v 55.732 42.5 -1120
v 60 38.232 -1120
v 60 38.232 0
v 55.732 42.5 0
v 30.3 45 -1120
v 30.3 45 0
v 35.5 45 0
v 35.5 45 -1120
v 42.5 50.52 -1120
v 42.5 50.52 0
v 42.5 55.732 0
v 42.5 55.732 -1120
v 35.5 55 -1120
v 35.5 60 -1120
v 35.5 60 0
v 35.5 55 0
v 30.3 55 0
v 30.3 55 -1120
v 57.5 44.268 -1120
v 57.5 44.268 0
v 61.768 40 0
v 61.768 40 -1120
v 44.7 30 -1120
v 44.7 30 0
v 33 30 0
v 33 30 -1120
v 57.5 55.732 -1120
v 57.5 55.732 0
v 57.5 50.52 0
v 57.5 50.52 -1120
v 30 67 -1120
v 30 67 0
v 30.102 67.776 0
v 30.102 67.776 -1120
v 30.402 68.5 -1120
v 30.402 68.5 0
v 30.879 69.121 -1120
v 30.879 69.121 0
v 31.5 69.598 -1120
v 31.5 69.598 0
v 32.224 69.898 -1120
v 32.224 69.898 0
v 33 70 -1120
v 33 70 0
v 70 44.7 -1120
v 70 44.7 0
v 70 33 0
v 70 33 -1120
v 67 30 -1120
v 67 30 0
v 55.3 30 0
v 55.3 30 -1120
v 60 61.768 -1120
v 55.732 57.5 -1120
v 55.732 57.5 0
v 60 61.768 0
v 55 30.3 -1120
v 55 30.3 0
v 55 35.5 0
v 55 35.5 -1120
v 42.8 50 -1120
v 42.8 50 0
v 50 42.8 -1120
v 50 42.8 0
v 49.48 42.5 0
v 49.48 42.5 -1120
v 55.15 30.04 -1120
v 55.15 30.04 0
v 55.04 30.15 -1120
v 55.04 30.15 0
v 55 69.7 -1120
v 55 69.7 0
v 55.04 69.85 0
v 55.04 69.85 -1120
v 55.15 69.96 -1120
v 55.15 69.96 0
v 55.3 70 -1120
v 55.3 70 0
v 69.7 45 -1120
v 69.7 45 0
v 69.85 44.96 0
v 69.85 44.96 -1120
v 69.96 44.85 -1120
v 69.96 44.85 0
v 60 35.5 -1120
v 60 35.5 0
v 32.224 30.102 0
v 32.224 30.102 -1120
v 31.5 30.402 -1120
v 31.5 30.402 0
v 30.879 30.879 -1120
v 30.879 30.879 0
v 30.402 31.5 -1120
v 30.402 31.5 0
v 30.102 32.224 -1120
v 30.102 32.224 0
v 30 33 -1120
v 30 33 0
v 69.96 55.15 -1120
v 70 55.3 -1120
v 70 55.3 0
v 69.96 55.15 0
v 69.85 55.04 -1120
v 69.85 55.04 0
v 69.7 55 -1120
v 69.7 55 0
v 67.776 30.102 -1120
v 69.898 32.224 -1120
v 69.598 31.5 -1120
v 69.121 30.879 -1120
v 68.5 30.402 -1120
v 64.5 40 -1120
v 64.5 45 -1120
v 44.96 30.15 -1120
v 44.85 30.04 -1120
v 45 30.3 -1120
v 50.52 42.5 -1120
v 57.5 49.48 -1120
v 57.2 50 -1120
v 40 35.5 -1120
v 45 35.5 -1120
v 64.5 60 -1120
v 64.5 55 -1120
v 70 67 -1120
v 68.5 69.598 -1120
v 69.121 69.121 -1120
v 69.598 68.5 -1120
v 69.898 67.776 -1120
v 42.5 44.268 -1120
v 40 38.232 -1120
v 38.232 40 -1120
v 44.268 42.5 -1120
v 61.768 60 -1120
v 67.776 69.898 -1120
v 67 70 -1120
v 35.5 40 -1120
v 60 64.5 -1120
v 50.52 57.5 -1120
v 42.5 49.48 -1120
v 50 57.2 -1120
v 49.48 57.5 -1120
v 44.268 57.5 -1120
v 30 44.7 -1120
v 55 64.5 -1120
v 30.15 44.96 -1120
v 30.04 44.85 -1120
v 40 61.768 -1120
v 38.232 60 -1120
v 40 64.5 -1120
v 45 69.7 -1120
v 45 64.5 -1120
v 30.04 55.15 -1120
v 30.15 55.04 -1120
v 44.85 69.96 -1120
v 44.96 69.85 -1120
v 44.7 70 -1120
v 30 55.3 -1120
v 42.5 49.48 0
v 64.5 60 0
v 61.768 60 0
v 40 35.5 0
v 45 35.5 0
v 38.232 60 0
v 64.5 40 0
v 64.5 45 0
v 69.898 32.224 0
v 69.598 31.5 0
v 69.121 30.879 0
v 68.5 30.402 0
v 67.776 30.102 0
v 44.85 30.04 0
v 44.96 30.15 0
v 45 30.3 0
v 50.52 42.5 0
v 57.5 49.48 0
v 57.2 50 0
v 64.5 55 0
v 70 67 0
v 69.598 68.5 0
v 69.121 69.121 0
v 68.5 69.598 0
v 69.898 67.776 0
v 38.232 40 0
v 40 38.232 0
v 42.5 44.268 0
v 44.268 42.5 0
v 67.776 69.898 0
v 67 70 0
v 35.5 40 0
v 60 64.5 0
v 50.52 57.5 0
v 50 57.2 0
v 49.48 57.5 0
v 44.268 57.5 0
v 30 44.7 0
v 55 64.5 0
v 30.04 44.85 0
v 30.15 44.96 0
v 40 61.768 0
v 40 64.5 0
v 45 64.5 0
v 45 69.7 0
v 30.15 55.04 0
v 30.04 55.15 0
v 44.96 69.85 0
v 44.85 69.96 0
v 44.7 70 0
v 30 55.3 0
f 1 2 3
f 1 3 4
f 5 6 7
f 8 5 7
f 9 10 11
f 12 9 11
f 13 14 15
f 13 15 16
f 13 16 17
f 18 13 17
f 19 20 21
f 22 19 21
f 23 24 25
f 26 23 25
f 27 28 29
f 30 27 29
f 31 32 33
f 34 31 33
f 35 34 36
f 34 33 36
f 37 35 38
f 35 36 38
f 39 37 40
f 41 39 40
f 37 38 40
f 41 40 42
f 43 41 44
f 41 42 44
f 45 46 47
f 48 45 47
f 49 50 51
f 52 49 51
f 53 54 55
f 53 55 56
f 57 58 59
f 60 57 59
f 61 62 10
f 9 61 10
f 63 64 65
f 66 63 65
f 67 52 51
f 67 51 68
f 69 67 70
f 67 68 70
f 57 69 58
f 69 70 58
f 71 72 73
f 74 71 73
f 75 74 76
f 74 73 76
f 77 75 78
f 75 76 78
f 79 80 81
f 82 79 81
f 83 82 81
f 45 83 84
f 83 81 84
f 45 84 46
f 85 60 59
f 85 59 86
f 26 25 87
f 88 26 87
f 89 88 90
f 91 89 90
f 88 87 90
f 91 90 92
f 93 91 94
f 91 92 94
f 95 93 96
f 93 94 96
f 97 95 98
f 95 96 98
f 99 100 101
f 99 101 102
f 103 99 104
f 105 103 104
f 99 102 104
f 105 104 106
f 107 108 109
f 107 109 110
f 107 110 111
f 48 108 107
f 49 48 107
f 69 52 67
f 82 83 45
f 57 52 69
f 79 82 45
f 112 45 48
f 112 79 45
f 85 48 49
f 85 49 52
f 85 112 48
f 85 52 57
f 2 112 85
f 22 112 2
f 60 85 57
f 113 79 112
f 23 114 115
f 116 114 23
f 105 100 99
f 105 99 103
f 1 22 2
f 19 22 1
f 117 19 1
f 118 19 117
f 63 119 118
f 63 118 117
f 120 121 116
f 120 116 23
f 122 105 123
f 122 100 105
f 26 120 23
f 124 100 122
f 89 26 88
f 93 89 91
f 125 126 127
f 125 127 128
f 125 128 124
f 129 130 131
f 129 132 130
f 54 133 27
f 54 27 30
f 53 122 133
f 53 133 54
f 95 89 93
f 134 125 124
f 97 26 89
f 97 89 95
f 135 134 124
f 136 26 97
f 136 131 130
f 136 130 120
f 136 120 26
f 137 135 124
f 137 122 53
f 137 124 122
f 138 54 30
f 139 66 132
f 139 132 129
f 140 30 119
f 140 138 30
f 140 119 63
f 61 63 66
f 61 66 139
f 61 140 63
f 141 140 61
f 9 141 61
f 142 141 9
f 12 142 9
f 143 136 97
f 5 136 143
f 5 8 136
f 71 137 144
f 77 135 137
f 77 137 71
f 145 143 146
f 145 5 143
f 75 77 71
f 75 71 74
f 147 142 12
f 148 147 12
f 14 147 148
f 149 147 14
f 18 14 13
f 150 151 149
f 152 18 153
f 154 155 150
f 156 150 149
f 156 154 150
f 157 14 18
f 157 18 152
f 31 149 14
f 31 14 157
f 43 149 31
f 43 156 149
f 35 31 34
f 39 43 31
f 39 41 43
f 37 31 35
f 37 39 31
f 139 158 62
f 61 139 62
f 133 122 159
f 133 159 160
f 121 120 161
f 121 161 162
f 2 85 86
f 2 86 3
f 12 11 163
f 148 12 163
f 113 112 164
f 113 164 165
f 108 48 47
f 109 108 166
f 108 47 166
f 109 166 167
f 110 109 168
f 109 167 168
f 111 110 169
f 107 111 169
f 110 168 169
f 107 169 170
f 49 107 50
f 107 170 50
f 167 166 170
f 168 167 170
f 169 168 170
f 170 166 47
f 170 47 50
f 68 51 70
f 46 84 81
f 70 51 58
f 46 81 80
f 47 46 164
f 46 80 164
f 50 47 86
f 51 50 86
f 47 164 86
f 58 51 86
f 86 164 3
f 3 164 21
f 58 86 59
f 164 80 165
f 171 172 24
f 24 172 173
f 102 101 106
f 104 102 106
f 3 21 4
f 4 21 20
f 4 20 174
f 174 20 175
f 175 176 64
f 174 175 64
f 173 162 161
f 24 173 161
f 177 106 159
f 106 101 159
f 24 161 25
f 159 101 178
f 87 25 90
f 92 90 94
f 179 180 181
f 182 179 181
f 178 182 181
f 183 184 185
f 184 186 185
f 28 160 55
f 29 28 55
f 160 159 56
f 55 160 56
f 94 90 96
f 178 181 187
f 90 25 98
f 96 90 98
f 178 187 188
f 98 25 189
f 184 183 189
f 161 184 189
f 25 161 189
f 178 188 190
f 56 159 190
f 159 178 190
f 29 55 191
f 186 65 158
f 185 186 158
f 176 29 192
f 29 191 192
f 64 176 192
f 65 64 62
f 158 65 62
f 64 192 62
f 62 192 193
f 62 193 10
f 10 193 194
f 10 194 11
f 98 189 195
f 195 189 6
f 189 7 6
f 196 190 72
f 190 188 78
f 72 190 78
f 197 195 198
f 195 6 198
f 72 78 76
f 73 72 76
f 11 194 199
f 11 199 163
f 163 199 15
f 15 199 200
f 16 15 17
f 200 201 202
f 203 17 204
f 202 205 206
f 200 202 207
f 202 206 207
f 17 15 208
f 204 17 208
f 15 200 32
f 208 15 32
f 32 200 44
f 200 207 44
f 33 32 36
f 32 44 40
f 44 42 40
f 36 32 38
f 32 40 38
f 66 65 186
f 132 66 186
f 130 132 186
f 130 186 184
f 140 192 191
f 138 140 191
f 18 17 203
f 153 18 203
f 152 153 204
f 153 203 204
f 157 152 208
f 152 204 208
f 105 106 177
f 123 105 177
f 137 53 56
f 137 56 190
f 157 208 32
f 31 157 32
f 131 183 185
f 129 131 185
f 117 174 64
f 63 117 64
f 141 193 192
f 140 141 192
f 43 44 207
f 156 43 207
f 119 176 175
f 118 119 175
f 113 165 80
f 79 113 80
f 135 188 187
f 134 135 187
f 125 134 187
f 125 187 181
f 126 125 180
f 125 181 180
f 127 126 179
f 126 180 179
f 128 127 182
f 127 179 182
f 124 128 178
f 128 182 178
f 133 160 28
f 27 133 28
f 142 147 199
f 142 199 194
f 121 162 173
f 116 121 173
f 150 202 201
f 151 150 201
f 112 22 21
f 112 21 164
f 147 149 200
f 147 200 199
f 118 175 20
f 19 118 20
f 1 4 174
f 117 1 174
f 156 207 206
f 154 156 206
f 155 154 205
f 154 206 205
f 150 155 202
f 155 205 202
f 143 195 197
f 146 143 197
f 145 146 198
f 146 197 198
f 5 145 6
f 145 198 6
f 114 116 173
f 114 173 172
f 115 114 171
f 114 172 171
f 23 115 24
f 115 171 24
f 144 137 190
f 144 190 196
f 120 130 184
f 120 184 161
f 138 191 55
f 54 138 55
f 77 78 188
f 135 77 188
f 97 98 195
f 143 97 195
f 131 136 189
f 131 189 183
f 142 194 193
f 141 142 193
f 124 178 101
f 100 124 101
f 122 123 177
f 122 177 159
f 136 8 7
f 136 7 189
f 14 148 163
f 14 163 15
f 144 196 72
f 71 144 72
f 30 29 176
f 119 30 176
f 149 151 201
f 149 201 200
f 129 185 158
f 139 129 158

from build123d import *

# Parameters (mm, degrees)
EXTRUDE_1_DEPTH = 1120


with BuildPart() as part:
    # Model → ﾎﾞｽ - 押し出し1 (new body)
    with BuildSketch(Plane.XY):
        with BuildLine():
            Line((69.700000053, 55.000000195), (64.500000711, 55.000000195))
            Line((64.500000711, 55.000000195), (64.500000711, 60.000002187))
            Line((64.500000711, 60.000002187), (61.76777021, 60.000002187))
            Line((61.76777021, 60.000002187), (57.500000584, 55.732232559))
            Line((57.500000584, 55.732232559), (57.500000584, 50.519614724))
            Line((57.500000584, 50.519614724), (57.199999339, 50.000000177))
            Line((57.199999339, 50.000000177), (57.500000584, 49.48038563))
            Line((57.500000584, 49.48038563), (57.500000584, 44.267767795))
            Line((57.500000584, 44.267767795), (61.76777021, 39.999998167))
            Line((61.76777021, 39.999998167), (64.500000711, 39.999998167))
            Line((64.500000711, 39.999998167), (64.500000711, 45.000000159))
            Line((64.500000711, 45.000000159), (69.700000053, 45.000000159))
            ThreePointArc((69.700000053, 45.000000159), (69.9121326, 44.912131981), (70.000000778, 44.699999434))
            Line((70.000000778, 44.699999434), (70.000000778, 33.000000332))
            ThreePointArc((70.000000778, 33.000000332), (69.121321121, 30.878679988), (67.000000778, 30.000000332))
            Line((67.000000778, 30.000000332), (55.300001675, 30.000000332))
            ThreePointArc((55.300001675, 30.000000332), (55.087869129, 30.08786851), (55.000000951, 30.300001056))
            Line((55.000000951, 30.300001056), (55.000000951, 35.500000399))
            Line((55.000000951, 35.500000399), (60.000002943, 35.500000399))
            Line((60.000002943, 35.500000399), (60.000002943, 38.232230899))
            Line((60.000002943, 38.232230899), (55.732233316, 42.500000527))
            Line((55.732233316, 42.500000527), (50.519615481, 42.500000527))
            Line((50.519615481, 42.500000527), (50.000000936, 42.800001775))
            Line((50.000000936, 42.800001775), (49.480386391, 42.500000527))
            Line((49.480386391, 42.500000527), (44.267768556, 42.500000527))
            Line((44.267768556, 42.500000527), (39.999998929, 38.232230899))
            Line((39.999998929, 38.232230899), (39.999998929, 35.500000399))
            Line((39.999998929, 35.500000399), (45.000000921, 35.500000399))
            Line((45.000000921, 35.500000399), (45.000000921, 30.300001056))
            ThreePointArc((45.000000921, 30.300001056), (44.912132743, 30.08786851), (44.700000197, 30.000000332))
            Line((44.700000197, 30.000000332), (33.000001094, 30.000000332))
            ThreePointArc((33.000001094, 30.000000332), (30.87868075, 30.878679988), (30.000001094, 33.000000332))
            Line((30.000001094, 33.000000332), (30.000001094, 44.699999434))
            ThreePointArc((30.000001094, 44.699999434), (30.087869272, 44.912131981), (30.300001819, 45.000000159))
            Line((30.300001819, 45.000000159), (35.500001161, 45.000000159))
            Line((35.500001161, 45.000000159), (35.500001161, 39.999998167))
            Line((35.500001161, 39.999998167), (38.232231661, 39.999998167))
            Line((38.232231661, 39.999998167), (42.499994889, 44.267761396))
            Line((42.499994889, 44.267761396), (42.499994889, 49.48038563))
            Line((42.499994889, 49.48038563), (42.799996134, 50.000000177))
            Line((42.799996134, 50.000000177), (42.499994889, 50.519614724))
            Line((42.499994889, 50.519614724), (42.499994889, 55.732238958))
            Line((42.499994889, 55.732238958), (38.232231661, 60.000002187))
            Line((38.232231661, 60.000002187), (35.500001161, 60.000002187))
            Line((35.500001161, 60.000002187), (35.500001161, 55.000000195))
            Line((35.500001161, 55.000000195), (30.300001819, 55.000000195))
            ThreePointArc((30.300001819, 55.000000195), (30.087869272, 55.087868373), (30.000001094, 55.30000092))
            Line((30.000001094, 55.30000092), (30.000001094, 67.000000023))
            ThreePointArc((30.000001094, 67.000000023), (30.87868075, 69.121320366), (33.000001094, 70.000000023))
            Line((33.000001094, 70.000000023), (44.700000197, 70.000000023))
            ThreePointArc((44.700000197, 70.000000023), (44.912132743, 69.912131845), (45.000000921, 69.699999298))
            Line((45.000000921, 69.699999298), (45.000000921, 64.499999956))
            Line((45.000000921, 64.499999956), (39.999998929, 64.499999956))
            Line((39.999998929, 64.499999956), (39.999998929, 61.767769455))
            Line((39.999998929, 61.767769455), (44.267768556, 57.499999827))
            Line((44.267768556, 57.499999827), (49.480386391, 57.499999827))
            Line((49.480386391, 57.499999827), (50.000000936, 57.199998579))
            Line((50.000000936, 57.199998579), (50.519615481, 57.499999827))
            Line((50.519615481, 57.499999827), (55.732233316, 57.499999827))
            Line((55.732233316, 57.499999827), (60.000002943, 61.767769455))
            Line((60.000002943, 61.767769455), (60.000002943, 64.499999956))
            Line((60.000002943, 64.499999956), (55.000000951, 64.499999956))
            Line((55.000000951, 64.499999956), (55.000000951, 69.699999298))
            ThreePointArc((55.000000951, 69.699999298), (55.087869129, 69.912131845), (55.300001675, 70.000000023))
            Line((55.300001675, 70.000000023), (67.000000778, 70.000000023))
            ThreePointArc((67.000000778, 70.000000023), (69.121321121, 69.121320366), (70.000000778, 67.000000023))
            Line((70.000000778, 67.000000023), (70.000000778, 55.30000092))
            ThreePointArc((70.000000778, 55.30000092), (69.9121326, 55.087868373), (69.700000053, 55.000000195))
        make_face()
    extrude(amount=-EXTRUDE_1_DEPTH)


solid = part.part
